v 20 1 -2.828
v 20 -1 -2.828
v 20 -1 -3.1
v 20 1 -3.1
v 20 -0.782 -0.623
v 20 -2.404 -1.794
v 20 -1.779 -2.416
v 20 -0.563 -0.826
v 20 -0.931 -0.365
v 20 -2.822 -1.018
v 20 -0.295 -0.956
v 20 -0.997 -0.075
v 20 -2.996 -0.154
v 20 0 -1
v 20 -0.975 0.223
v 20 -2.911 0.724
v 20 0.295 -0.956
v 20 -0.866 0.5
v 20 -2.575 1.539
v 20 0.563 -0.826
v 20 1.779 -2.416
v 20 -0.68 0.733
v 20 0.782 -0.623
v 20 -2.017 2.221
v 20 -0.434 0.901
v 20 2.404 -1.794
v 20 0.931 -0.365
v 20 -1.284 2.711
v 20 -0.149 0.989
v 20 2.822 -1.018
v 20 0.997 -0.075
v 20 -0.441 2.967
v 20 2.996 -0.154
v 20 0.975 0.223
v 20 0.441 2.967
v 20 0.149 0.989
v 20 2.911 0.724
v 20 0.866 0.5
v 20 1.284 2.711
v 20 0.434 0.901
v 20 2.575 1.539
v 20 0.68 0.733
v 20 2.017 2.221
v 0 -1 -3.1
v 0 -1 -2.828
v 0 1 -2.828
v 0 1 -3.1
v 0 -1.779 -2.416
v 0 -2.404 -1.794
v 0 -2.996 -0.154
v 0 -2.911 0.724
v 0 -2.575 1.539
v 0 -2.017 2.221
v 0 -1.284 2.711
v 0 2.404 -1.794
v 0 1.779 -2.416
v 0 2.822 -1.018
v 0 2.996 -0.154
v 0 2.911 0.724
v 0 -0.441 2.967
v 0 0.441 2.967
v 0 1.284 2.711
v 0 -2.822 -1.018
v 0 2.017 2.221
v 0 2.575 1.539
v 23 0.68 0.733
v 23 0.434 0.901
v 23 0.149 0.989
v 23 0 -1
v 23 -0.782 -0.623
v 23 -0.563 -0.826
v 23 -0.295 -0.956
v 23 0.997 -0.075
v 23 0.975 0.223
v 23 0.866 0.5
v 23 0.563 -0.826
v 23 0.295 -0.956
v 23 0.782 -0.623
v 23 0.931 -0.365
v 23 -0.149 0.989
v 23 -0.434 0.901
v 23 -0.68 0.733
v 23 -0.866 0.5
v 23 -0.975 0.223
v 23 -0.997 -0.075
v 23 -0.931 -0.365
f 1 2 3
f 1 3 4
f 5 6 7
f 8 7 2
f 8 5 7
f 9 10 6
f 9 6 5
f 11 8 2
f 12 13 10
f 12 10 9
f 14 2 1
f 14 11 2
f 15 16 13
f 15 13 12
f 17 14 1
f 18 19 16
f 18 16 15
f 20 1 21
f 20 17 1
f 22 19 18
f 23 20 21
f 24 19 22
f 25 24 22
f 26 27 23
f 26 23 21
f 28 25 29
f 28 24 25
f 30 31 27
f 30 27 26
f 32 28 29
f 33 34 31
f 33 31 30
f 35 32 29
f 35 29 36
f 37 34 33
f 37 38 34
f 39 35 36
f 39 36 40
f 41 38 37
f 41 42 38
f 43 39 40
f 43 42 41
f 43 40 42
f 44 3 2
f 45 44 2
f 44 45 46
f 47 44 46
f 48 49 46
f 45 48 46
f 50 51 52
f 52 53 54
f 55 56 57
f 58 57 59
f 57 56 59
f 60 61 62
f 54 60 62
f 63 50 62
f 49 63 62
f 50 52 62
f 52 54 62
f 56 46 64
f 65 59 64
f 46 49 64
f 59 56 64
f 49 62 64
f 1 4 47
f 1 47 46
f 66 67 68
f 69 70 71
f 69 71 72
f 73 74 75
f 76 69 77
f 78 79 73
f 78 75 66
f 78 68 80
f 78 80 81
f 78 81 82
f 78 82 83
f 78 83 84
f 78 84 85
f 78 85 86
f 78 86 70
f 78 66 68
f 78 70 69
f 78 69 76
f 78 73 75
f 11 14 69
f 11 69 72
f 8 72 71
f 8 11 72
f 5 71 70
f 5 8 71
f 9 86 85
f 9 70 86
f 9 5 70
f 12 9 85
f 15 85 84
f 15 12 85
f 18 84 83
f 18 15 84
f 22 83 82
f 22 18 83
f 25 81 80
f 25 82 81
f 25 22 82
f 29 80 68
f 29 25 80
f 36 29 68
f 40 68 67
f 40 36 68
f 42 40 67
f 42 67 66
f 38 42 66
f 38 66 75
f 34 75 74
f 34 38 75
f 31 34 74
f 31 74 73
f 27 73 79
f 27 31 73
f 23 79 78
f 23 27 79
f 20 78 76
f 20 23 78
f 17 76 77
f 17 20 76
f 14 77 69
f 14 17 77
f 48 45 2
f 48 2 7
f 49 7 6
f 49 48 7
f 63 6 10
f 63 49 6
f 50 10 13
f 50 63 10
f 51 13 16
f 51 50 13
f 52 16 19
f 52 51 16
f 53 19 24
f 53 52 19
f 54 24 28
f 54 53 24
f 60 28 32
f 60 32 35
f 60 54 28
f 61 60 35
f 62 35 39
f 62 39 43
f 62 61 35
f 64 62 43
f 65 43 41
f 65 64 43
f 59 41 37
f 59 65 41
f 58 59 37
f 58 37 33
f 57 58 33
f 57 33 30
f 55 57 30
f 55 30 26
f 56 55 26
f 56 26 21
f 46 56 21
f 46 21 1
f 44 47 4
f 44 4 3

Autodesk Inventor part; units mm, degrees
ref_plane "YZ Plane" through (0, 0, 0) normal (1, 0, 0) x (0, 1, 0)
ref_plane "XZ Plane" through (0, 0, 0) normal (0, 1, 0) x (-1, 0, 0)
ref_plane "XY Plane" through (0, 0, 0) normal (0, 0, 1) x (1, 0, 0)
sketch "Sketch1" plane through (0, 0, 0) normal (1, 0, 0) x (0, 1, 0)
  circle A0 centre (0, 0) radius 3
  dimension "d0" = 6
extrude "Extrusion1" add sketch "Sketch1" along normal blind 20
sketch "Sketch2" plane through (20, 0, 0) normal (1, 0, 0) x (0, 0, -1)
  circle A0 centre (0, 0) radius 3 projected
  circle A1 centre (0, 0) radius 1
  dimension "d3" = 2
extrude "Extrusion2" add sketch "Sketch2" along normal blind 3 contours A1
sketch "Sketch3" plane through (20, 0, 0) normal (1, 0, 0) x (0, 0, -1)
  circle A0 centre (0, 0) radius 1 projected
  circle A1 centre (0, 0) radius 3 projected
  line L0 (3, 0) -> (3.1, 0)
  line L1 (3.1, 0) -> (3.1, -1)
  line L2 (3.1, -1) -> (3.1, 1)
  line L3 (3.1, 1) -> (2.8284, 1)
  circle A2 centre (0, 0) radius 3 projected
  line L4 (3.1, -1) -> (2.8284, -1)
  dimension "d6" = 0.1
  dimension "d7" = 2
extrude "Extrusion3" add sketch "Sketch3" against normal up to surface (20 mm away) contours L0 L1 L4 A1 | A1 L3 L2 L0
properties part number "silnik_2"
